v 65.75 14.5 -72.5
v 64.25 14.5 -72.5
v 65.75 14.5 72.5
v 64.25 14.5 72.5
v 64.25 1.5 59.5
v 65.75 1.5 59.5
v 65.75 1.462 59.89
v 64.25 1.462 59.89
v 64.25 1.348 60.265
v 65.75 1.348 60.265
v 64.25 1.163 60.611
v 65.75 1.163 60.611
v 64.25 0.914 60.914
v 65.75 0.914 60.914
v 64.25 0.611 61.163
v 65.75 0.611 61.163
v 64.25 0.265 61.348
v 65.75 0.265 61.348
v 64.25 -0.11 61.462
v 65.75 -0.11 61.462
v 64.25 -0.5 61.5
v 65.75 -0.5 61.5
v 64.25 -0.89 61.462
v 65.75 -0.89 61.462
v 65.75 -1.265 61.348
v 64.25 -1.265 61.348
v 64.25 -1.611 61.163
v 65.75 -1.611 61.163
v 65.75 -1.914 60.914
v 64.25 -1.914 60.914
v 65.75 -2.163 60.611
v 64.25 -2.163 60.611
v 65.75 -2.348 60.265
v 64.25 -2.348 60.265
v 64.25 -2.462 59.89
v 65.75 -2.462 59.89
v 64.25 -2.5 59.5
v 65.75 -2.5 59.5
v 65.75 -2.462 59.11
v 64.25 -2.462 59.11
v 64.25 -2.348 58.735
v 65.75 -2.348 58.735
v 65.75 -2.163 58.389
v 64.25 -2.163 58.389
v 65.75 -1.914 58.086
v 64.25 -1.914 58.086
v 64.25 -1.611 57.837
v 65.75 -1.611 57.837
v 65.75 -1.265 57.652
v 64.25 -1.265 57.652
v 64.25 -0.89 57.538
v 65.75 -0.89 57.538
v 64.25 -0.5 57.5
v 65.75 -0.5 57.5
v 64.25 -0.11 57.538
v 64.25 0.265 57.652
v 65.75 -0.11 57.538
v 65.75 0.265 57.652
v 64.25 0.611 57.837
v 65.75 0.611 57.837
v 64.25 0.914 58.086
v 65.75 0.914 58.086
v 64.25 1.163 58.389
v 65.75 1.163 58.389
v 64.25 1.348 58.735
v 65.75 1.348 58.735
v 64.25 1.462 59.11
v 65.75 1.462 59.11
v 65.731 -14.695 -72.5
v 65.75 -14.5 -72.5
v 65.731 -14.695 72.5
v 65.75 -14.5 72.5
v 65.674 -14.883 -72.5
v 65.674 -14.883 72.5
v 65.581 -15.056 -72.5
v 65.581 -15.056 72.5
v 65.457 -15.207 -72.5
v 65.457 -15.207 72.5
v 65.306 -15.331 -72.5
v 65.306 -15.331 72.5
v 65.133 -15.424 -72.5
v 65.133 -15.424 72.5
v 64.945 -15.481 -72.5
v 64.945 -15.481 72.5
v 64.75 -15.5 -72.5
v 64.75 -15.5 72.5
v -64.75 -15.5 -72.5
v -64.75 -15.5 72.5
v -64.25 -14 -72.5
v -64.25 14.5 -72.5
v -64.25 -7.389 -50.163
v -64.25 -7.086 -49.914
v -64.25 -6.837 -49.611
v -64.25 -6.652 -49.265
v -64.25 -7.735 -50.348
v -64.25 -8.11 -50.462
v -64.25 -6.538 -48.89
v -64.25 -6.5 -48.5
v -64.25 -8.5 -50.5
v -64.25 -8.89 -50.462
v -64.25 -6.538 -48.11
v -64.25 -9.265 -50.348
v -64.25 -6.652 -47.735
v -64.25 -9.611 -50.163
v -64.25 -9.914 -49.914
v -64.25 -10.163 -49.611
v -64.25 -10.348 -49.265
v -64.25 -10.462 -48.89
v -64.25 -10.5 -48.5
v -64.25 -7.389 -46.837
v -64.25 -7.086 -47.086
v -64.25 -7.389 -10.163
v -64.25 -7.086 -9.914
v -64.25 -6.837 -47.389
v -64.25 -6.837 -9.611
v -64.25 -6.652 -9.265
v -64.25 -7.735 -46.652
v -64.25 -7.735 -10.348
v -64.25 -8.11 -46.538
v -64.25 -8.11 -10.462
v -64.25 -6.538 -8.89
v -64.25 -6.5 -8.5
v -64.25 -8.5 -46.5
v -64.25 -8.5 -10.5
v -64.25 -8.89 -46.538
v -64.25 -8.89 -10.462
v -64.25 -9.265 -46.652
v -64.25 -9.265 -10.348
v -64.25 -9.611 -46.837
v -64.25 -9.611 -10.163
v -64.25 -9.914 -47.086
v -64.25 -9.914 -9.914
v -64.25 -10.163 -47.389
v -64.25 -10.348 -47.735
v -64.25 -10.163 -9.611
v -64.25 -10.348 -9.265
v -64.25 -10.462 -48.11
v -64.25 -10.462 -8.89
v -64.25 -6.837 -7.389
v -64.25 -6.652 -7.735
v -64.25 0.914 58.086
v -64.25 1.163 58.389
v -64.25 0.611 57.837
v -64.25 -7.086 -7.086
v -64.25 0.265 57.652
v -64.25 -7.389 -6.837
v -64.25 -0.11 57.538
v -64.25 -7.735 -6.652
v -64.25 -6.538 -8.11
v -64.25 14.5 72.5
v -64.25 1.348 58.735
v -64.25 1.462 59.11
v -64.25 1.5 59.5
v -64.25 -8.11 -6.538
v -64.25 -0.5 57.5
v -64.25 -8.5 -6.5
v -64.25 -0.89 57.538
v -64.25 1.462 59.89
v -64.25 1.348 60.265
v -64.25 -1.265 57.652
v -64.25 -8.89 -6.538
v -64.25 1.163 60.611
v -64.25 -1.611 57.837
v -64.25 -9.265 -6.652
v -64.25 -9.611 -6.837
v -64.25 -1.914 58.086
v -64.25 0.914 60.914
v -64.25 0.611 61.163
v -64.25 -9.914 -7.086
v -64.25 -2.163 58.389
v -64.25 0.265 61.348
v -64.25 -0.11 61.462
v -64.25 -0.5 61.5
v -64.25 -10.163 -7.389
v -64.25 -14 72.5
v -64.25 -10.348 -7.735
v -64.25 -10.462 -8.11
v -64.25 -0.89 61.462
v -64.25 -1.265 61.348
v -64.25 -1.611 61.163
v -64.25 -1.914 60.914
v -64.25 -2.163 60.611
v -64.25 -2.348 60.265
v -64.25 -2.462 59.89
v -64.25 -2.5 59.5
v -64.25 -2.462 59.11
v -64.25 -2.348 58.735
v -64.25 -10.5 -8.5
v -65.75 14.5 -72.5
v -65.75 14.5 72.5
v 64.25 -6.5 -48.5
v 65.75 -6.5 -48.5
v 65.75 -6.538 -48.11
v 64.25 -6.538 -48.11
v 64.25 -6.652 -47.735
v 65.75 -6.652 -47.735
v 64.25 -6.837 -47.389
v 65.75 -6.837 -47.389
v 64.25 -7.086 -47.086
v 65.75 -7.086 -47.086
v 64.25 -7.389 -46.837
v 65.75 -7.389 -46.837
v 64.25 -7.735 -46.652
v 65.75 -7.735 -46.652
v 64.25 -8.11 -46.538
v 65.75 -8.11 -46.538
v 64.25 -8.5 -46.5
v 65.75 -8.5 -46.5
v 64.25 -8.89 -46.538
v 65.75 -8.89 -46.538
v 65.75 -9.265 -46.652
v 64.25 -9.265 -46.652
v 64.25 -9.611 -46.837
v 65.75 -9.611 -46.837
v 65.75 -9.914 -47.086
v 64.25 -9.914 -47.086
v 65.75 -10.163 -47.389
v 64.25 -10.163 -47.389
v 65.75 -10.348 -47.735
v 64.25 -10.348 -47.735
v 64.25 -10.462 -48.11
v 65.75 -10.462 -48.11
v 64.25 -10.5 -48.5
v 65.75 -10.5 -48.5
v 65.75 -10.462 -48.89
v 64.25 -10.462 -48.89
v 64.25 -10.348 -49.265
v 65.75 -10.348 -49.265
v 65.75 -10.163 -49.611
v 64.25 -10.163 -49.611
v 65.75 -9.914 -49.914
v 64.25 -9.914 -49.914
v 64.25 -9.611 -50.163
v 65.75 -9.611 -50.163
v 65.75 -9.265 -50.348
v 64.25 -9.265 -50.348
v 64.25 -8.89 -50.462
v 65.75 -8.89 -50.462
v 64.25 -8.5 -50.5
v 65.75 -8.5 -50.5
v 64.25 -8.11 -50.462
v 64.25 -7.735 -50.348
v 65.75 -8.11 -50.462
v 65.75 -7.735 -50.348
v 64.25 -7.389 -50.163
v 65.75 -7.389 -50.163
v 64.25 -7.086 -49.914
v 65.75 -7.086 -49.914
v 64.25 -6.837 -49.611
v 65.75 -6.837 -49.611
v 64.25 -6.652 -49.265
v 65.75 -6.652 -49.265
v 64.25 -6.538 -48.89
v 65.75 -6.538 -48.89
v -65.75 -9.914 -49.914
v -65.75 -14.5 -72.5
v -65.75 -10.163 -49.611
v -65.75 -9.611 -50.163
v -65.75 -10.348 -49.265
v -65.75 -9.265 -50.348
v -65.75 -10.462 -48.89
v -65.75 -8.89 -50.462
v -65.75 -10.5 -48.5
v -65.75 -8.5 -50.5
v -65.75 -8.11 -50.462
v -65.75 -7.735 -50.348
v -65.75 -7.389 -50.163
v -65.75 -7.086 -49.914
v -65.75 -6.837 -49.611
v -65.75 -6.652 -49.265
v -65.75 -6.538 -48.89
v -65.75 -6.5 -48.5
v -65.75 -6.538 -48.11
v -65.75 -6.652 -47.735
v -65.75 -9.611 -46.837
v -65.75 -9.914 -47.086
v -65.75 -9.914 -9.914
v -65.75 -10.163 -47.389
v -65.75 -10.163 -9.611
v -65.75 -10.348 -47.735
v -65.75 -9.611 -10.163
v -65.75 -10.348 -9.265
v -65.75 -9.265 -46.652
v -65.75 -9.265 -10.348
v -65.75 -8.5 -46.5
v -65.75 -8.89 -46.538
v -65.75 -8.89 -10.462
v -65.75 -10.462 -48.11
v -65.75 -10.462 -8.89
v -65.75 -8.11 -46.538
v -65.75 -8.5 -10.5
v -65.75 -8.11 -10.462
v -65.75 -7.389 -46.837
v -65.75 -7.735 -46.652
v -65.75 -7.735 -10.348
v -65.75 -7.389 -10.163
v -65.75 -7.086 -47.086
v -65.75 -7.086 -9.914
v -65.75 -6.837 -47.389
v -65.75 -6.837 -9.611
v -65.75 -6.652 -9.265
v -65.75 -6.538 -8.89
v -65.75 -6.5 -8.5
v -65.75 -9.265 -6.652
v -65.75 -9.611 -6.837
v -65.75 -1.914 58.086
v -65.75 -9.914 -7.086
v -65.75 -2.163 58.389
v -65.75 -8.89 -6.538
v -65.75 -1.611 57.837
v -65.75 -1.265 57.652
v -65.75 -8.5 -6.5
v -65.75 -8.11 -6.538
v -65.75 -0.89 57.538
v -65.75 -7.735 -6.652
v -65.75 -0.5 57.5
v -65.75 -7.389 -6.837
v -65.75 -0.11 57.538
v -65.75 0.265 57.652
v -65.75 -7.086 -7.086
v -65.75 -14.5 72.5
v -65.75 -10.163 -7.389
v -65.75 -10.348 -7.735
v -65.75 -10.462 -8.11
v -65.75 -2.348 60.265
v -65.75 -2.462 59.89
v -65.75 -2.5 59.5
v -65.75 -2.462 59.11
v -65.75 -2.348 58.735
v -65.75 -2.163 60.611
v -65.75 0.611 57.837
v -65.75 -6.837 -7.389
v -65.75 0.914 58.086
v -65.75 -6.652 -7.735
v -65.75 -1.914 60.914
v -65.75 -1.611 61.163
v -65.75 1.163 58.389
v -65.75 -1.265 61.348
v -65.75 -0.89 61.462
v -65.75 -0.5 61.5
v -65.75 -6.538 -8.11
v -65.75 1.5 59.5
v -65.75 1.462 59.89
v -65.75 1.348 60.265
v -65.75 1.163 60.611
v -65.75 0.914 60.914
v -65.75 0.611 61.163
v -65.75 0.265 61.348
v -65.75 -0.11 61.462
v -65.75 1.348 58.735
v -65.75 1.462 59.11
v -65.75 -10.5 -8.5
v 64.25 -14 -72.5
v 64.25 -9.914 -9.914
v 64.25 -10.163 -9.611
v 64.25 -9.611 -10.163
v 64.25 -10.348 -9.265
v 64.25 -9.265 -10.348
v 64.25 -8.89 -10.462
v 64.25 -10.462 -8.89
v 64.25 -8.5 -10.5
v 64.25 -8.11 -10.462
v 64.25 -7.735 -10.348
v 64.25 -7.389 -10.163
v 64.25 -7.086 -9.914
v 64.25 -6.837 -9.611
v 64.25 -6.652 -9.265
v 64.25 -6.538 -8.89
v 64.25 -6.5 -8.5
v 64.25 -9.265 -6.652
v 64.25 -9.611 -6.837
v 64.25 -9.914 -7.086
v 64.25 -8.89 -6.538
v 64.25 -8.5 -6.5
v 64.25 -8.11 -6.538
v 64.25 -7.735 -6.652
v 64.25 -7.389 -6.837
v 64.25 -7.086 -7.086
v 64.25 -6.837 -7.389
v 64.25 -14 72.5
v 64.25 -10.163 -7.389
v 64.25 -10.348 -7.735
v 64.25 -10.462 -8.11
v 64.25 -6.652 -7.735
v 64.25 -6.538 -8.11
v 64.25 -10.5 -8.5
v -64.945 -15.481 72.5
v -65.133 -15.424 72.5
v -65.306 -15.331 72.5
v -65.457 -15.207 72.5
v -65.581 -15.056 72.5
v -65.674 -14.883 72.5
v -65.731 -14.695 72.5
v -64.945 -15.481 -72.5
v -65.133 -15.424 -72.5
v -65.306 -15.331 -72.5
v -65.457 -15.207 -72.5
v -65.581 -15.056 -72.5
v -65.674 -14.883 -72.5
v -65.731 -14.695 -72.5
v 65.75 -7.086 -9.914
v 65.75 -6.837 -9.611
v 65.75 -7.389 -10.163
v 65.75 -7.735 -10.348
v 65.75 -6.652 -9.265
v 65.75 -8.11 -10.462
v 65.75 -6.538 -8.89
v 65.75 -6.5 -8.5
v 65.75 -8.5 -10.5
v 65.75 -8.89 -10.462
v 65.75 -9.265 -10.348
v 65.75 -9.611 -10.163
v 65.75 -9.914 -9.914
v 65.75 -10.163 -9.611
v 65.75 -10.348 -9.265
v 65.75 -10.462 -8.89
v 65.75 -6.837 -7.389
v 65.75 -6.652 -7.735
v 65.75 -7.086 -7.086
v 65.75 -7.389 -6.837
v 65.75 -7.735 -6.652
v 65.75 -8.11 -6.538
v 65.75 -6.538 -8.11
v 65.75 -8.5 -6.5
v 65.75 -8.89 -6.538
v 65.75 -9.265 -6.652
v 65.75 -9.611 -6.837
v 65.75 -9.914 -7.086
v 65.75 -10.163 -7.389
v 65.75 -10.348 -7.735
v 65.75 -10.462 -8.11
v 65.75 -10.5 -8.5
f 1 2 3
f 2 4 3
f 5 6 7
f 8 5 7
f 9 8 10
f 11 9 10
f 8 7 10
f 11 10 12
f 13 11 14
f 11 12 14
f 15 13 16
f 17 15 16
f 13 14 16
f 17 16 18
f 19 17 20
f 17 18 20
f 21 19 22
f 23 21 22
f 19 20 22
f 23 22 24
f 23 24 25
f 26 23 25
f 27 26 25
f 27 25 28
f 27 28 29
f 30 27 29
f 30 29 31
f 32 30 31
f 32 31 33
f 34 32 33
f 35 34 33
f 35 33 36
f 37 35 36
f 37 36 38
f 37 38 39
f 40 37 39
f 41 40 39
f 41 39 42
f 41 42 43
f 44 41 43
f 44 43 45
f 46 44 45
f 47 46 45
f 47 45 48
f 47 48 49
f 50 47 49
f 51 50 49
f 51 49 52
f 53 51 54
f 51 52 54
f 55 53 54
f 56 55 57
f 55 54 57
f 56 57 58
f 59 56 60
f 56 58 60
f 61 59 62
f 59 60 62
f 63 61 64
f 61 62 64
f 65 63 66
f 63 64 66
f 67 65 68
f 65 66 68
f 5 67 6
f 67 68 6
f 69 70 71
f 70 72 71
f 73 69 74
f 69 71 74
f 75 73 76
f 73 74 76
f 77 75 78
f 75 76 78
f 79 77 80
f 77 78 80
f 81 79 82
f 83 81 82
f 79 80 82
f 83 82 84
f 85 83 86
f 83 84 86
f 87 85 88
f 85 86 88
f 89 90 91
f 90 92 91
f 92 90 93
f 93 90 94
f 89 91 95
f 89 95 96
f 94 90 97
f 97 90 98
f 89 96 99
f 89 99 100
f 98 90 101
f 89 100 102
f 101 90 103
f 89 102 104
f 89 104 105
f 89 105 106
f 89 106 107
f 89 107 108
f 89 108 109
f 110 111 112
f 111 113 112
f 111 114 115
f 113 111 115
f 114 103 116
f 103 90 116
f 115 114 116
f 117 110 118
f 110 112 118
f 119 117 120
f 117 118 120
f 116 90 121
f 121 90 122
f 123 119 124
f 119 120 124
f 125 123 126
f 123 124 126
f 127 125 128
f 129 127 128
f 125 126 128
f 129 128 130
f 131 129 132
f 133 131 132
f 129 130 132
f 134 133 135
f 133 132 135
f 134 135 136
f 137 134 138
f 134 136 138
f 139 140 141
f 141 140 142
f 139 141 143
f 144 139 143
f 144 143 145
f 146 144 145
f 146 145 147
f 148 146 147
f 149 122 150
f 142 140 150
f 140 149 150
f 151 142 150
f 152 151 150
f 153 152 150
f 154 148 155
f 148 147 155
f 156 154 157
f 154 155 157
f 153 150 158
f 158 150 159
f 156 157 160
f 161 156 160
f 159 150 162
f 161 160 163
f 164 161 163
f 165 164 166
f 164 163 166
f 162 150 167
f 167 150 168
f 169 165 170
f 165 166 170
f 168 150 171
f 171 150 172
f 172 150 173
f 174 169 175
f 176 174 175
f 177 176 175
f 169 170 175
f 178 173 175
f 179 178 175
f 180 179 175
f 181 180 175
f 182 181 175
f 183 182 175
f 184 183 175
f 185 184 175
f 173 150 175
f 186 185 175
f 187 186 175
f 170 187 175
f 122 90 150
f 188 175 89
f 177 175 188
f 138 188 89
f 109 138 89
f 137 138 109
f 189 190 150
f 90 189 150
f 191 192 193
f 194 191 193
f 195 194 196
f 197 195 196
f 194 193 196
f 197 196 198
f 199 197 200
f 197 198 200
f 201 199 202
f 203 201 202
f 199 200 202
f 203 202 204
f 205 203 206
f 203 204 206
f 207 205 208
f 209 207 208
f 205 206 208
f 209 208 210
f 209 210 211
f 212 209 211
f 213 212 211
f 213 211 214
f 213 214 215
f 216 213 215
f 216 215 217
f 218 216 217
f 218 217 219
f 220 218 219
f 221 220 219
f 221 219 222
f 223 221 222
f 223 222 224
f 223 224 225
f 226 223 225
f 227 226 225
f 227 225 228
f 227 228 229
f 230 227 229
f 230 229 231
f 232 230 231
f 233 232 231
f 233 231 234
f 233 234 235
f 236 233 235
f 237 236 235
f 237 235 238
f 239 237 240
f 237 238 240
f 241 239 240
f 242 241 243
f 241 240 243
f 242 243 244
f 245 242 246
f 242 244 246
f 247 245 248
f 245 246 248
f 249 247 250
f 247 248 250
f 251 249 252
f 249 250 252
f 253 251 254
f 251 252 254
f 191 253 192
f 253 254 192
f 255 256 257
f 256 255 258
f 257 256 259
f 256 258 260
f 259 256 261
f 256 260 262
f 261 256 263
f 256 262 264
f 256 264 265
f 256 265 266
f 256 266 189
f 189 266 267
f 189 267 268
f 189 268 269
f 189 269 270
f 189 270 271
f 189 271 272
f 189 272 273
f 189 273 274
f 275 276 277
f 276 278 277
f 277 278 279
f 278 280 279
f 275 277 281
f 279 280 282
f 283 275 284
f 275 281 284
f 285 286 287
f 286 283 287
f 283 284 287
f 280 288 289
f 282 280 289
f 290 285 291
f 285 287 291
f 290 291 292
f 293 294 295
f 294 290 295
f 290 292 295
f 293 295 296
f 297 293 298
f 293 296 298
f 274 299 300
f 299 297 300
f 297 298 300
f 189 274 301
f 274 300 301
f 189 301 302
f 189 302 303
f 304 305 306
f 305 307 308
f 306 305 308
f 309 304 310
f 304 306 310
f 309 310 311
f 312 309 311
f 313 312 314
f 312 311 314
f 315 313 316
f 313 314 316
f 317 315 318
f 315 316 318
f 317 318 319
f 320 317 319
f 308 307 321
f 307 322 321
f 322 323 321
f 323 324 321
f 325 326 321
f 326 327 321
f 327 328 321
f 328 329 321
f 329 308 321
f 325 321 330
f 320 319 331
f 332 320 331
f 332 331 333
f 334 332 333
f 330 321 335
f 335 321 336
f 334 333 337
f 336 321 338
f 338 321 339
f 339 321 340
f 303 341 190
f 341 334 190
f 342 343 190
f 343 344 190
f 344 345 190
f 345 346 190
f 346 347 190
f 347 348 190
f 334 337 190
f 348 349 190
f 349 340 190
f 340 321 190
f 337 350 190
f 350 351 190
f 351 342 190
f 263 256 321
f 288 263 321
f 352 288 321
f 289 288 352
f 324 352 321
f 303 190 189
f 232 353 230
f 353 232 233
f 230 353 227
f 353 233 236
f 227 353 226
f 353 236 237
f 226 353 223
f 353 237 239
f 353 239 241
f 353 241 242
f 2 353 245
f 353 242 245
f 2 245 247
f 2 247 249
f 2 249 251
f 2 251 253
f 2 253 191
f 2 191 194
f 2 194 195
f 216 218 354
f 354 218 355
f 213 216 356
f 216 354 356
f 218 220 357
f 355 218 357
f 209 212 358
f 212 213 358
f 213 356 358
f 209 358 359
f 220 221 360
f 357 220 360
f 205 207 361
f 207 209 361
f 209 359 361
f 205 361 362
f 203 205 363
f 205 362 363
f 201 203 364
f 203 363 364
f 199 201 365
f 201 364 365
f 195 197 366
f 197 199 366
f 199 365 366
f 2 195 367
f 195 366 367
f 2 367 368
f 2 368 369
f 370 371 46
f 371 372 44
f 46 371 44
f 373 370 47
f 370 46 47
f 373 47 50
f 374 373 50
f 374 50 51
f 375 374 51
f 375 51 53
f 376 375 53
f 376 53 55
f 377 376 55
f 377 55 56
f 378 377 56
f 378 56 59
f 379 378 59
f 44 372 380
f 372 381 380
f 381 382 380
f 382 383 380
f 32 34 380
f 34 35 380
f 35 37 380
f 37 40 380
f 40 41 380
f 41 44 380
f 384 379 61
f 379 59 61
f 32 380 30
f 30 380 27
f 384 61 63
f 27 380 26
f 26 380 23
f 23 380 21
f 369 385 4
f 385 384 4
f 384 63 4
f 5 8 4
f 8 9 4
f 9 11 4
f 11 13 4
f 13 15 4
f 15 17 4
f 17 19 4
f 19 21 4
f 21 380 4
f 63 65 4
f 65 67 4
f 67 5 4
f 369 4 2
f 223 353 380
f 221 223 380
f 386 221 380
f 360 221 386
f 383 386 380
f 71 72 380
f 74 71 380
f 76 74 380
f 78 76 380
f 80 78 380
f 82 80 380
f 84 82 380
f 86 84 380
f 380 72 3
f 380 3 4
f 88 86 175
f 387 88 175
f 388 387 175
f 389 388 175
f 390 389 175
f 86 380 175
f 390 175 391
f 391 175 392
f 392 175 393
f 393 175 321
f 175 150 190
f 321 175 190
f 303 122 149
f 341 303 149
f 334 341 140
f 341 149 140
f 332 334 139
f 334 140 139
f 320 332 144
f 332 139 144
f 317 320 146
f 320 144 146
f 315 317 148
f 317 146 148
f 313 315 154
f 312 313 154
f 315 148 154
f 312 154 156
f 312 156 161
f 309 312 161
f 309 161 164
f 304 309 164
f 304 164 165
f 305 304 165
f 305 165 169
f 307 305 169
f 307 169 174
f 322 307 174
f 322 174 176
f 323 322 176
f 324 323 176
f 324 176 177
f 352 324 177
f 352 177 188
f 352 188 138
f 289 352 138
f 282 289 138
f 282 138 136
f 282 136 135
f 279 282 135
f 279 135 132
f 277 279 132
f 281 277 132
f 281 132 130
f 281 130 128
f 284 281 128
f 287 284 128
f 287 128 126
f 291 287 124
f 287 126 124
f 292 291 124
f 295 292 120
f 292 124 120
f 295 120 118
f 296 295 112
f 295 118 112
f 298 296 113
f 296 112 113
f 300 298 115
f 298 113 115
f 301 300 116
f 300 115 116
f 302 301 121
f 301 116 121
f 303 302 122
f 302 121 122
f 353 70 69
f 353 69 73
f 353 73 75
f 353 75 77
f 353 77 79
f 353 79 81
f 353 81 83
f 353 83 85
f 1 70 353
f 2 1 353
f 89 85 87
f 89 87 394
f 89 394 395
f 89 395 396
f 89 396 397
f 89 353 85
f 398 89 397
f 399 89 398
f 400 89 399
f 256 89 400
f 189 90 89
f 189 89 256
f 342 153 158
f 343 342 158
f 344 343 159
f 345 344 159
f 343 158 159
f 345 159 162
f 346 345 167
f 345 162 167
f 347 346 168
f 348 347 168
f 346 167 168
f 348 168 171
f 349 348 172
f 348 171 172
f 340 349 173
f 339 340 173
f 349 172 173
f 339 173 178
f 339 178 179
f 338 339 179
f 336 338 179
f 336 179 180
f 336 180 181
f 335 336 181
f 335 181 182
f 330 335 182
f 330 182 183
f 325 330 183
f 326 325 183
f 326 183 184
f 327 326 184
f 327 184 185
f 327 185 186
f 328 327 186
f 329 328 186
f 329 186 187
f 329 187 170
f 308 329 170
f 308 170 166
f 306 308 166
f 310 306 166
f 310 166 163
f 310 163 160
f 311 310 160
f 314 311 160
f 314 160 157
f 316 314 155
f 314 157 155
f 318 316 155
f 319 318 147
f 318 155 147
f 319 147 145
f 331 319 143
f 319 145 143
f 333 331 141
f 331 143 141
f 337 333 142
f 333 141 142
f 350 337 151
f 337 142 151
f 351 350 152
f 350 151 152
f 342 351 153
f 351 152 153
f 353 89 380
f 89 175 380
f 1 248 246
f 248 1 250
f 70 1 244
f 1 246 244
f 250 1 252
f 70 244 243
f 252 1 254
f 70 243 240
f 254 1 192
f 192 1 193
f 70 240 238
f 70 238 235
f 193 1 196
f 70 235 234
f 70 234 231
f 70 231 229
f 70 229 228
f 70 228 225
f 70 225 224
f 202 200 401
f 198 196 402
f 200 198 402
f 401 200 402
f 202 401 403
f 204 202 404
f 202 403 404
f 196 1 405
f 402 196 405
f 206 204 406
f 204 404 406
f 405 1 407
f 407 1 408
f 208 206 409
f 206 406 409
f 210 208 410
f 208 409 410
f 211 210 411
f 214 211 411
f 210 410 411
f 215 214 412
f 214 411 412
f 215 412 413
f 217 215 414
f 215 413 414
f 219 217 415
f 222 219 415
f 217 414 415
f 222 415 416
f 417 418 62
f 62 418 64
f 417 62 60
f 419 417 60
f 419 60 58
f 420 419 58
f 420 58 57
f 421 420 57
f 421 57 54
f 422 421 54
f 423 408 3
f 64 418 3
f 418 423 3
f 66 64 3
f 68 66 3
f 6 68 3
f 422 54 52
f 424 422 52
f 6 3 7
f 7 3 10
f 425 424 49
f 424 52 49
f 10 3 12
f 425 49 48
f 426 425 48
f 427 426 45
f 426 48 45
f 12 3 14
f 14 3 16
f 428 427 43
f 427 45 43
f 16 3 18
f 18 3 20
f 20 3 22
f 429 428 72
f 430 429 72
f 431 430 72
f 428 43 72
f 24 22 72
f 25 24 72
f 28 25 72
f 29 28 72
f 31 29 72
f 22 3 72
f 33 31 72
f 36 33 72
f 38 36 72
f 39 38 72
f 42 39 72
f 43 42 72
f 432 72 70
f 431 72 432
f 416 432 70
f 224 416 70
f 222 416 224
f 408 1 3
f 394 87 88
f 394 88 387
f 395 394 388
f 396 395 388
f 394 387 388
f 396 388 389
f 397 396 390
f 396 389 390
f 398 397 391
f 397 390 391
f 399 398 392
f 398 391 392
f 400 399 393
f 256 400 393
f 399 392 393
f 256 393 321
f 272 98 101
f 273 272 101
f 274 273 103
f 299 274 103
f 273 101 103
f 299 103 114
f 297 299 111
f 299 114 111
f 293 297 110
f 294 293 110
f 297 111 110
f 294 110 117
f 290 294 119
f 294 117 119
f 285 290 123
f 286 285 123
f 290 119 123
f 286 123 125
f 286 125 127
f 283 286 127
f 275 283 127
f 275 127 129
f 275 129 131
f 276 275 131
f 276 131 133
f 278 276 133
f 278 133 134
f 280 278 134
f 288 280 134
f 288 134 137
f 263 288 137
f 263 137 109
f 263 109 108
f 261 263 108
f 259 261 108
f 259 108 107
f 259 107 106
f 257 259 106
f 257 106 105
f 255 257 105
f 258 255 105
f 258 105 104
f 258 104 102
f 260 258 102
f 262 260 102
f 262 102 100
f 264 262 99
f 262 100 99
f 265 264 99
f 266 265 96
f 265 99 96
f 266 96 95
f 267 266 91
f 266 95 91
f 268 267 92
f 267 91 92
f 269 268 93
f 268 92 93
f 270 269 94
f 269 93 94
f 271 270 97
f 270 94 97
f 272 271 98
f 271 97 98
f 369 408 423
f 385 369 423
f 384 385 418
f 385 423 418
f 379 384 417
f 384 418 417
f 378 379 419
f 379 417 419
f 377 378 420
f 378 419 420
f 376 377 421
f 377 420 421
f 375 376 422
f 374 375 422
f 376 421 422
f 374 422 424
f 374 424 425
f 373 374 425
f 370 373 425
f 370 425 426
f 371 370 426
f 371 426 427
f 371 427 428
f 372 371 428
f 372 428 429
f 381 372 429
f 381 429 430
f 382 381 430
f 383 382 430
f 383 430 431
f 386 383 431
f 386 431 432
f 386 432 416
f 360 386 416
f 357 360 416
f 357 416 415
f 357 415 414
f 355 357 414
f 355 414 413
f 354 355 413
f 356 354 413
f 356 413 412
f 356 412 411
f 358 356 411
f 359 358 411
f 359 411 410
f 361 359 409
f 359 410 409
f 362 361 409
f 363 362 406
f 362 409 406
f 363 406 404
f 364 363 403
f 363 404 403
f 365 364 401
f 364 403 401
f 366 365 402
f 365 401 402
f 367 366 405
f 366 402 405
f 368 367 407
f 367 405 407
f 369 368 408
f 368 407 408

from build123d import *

# Parameters (mm, degrees)
SALIENTE_EXTRUIR1_DEPTH = 72.5
CROQUIS2_R              = 2
CORTAR_EXTRUIR1_DEPTH   = 145


with BuildPart() as part:
    # Croquis1 → Saliente-Extruir1 (new, symmetric)
    with BuildSketch(Plane.XY):
        with BuildLine():
            Line((-64.25, 14.5), (-64.25, -14))
            Line((-64.25, -14), (64.25, -14))
            Line((64.25, -14), (64.25, 14.5))
            Line((64.25, 14.5), (65.75, 14.5))
            Line((65.75, 14.5), (65.75, -14.5))
            ThreePointArc((65.75, -14.5), (65.457106781, -15.207106781), (64.75, -15.5))
            Line((64.75, -15.5), (-64.75, -15.5))
            ThreePointArc((-64.75, -15.5), (-65.457106781, -15.207106781), (-65.75, -14.5))
            Line((-65.75, -14.5), (-65.75, 14.5))
            Line((-65.75, 14.5), (-64.25, 14.5))
        make_face()
    extrude(amount=SALIENTE_EXTRUIR1_DEPTH, both=True)

    # Croquis2 → Cortar-Extruir1 (cut)
    with BuildSketch(Plane(origin=(65.75, 0, 0), x_dir=(0, 0, -1), z_dir=(1, 0, 0))):
        with Locations(Location((-59.5, -0.5, 0), (0, 0, 90))):
            Circle(CROQUIS2_R)
        with Locations(Location((8.5, -8.5, 0), (0, 0, 90))):
            Circle(CROQUIS2_R)
        with Locations(Location((48.5, -8.5, 0), (0, 0, 90))):
            Circle(CROQUIS2_R)
    extrude(amount=-CORTAR_EXTRUIR1_DEPTH, mode=Mode.SUBTRACT)


solid = part.part
